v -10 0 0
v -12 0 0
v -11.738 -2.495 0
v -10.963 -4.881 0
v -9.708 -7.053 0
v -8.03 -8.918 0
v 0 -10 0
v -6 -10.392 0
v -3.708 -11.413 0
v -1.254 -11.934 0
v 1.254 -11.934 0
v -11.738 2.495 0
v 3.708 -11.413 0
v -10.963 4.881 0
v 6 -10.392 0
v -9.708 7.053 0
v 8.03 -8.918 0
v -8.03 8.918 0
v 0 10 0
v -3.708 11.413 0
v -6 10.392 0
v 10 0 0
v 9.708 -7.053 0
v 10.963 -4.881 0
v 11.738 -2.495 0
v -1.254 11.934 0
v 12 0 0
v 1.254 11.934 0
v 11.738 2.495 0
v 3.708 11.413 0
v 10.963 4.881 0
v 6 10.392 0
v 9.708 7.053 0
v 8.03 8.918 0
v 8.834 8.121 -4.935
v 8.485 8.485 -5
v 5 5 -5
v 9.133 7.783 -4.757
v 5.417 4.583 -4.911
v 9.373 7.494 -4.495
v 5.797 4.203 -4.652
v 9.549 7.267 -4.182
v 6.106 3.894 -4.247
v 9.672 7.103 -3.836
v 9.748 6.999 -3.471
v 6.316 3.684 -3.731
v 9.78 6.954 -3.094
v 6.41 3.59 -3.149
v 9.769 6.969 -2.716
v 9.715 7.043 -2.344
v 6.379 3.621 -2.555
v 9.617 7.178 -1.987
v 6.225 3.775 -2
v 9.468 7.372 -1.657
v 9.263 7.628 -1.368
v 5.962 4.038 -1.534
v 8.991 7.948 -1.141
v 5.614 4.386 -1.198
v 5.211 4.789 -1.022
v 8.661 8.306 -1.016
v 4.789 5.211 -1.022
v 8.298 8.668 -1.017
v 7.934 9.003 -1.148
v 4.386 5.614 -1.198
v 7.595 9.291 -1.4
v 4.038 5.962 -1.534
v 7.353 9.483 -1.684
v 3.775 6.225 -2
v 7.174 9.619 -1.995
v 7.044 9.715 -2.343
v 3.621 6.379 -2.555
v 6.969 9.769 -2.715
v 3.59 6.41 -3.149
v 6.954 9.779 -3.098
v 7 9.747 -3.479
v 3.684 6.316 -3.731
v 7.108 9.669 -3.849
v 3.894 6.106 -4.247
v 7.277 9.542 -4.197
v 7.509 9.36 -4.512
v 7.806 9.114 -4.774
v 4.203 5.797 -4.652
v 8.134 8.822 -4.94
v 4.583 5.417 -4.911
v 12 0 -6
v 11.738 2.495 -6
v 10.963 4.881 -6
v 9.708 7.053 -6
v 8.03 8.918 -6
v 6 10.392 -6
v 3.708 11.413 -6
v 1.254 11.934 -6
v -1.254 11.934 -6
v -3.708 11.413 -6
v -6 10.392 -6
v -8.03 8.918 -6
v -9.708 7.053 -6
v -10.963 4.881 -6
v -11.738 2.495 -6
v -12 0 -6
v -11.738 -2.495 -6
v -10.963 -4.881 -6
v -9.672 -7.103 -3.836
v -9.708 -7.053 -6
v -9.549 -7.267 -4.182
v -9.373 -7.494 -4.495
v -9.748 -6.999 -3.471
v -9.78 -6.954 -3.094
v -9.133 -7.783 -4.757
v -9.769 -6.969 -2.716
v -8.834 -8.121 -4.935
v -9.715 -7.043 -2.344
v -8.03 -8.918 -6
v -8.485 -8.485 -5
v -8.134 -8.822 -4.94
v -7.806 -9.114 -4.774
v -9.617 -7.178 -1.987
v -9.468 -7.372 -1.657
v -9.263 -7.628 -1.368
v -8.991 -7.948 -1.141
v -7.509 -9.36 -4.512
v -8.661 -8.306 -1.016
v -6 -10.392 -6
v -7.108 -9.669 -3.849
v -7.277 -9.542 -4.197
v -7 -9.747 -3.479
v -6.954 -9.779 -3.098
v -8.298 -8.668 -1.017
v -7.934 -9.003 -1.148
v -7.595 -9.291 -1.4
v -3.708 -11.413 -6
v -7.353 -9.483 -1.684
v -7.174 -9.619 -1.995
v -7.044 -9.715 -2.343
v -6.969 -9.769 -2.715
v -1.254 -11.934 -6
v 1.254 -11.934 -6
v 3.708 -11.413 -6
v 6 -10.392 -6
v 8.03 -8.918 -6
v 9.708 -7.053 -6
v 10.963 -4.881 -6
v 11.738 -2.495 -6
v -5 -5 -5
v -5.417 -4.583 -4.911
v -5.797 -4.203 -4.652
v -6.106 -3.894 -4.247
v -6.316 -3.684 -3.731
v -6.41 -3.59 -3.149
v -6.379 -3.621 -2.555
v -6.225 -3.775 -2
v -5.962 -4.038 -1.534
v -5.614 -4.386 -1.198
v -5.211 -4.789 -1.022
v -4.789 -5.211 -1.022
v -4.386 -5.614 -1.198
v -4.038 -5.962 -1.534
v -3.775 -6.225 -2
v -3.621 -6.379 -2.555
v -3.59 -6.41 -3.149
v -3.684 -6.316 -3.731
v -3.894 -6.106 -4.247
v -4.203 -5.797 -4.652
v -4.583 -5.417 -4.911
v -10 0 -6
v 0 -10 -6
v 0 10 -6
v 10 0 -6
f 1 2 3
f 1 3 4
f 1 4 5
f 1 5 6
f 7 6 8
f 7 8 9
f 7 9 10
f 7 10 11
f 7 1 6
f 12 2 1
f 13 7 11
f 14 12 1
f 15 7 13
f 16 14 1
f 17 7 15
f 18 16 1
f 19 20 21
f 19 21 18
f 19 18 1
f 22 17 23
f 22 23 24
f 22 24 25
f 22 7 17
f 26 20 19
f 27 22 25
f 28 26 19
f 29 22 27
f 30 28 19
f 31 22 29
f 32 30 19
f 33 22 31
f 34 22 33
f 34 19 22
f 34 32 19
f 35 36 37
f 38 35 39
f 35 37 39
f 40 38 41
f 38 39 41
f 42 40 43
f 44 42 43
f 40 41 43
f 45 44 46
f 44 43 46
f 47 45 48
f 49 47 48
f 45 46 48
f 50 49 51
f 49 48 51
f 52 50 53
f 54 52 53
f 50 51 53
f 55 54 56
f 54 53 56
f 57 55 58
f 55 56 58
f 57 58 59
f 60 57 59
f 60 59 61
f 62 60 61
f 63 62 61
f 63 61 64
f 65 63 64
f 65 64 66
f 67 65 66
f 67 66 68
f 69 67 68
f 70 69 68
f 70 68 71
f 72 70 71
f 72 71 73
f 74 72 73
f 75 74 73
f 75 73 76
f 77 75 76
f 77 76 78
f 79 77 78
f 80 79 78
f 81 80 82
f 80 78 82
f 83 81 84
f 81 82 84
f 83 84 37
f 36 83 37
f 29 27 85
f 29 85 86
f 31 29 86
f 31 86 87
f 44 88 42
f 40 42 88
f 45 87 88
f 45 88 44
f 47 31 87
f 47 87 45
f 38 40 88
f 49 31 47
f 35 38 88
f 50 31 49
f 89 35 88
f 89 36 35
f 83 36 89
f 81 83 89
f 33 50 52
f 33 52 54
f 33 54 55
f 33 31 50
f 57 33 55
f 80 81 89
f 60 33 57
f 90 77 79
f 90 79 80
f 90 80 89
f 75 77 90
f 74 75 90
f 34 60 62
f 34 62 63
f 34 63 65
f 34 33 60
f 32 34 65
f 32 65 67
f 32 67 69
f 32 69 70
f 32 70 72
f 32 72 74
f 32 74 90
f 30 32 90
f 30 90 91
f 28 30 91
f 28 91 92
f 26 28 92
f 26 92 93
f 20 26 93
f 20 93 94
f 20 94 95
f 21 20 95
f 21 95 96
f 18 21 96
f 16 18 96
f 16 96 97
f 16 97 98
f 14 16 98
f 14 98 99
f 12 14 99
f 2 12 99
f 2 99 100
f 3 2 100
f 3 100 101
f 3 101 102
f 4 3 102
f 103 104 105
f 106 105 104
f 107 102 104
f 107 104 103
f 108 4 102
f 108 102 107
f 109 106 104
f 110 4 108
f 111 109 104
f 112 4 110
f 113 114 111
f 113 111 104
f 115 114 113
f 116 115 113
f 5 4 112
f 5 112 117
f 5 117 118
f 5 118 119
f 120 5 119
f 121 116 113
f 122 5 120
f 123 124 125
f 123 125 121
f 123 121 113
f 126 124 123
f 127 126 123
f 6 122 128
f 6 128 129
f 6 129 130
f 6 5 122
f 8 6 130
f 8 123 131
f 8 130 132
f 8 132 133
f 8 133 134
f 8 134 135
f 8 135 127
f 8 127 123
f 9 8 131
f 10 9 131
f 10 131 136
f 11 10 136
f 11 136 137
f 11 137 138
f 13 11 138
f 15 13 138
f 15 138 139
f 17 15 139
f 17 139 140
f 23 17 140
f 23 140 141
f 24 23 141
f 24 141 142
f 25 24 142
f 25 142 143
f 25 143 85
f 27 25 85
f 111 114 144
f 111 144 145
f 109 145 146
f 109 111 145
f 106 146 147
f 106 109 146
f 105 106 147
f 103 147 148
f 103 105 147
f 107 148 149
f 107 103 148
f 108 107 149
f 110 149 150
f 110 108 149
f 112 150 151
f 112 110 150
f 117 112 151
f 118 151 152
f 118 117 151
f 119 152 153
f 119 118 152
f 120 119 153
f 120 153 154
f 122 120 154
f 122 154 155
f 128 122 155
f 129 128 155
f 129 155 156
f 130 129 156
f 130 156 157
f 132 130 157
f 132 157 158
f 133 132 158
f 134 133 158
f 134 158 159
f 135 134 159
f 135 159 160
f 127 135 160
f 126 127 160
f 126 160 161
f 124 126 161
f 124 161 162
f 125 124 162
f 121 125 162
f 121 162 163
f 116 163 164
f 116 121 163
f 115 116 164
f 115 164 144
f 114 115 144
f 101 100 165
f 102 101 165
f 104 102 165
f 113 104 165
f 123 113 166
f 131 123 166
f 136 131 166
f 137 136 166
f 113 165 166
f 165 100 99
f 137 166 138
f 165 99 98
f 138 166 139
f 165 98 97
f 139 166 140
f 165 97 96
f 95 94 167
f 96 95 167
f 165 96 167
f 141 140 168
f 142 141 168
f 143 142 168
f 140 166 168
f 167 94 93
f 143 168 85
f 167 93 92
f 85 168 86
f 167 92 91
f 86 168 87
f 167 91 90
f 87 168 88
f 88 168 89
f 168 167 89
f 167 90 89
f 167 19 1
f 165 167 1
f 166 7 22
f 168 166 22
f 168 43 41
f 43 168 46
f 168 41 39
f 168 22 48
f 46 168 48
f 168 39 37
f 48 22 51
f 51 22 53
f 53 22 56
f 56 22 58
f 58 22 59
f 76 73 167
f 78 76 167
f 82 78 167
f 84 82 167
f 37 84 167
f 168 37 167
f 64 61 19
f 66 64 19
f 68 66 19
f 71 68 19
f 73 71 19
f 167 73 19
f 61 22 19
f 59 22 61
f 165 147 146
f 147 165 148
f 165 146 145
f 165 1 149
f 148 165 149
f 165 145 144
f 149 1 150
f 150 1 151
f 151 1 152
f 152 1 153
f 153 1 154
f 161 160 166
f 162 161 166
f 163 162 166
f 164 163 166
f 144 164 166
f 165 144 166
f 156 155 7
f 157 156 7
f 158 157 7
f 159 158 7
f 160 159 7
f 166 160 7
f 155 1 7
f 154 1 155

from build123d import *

# Parameters (mm, degrees)
SKETCH_1_R          = 12
EXTRUDE_1_DEPTH     = 6
CUT_EXTRUDE_1_DEPTH = 10
CUT_EXTRUDE_6_DEPTH = 11
CUT_EXTRUDE_START   = -11
CUT_EXTRUDE_7_DEPTH = 11


with BuildPart() as part:
    # 草图1 → 凸台-拉伸1 (new body)
    with BuildSketch(Plane.XY):
        Circle(SKETCH_1_R)
    extrude(amount=-EXTRUDE_1_DEPTH)

    # 草图2 → 切除-拉伸1 (cut)
    with BuildSketch(Plane.XY):
        Polygon((10, 0), (0, 10), (-10, 0), (0, -10), align=None)
    extrude(amount=-CUT_EXTRUDE_1_DEPTH, mode=Mode.SUBTRACT)

    # 草图7 → 切除-拉伸6 (cut)
    with BuildSketch(Plane(origin=(5, 5, 0), x_dir=(0, 0, 1), z_dir=(-0.7071067811865477, -0.7071067811865475, 0))):
        with BuildLine():
            ThreePointArc((-1, 0), (-3, 2), (-5, 0))
            Line((-5, 0), (-1, 0))
        make_face()
        with BuildLine():
            Line((-1, 0), (-5, 0))
            ThreePointArc((-5, 0), (-3, -2), (-1, 0))
        make_face()
    extrude(amount=-CUT_EXTRUDE_6_DEPTH, mode=Mode.SUBTRACT)

    # 草图8 → 切除-拉伸7 (cut)
    with BuildSketch(Plane(origin=(-5, -5, 0), x_dir=(0, 0, -1), z_dir=(0.7071067811865477, 0.7071067811865475, 0)).offset(CUT_EXTRUDE_START)):
        with BuildLine():
            ThreePointArc((1, 0), (3, -2), (5, 0))
            Line((5, 0), (1, 0))
        make_face()
        with BuildLine():
            Line((1, 0), (5, 0))
            ThreePointArc((5, 0), (3, 2), (1, 0))
        make_face()
    extrude(amount=CUT_EXTRUDE_7_DEPTH, mode=Mode.SUBTRACT)


solid = part.part
